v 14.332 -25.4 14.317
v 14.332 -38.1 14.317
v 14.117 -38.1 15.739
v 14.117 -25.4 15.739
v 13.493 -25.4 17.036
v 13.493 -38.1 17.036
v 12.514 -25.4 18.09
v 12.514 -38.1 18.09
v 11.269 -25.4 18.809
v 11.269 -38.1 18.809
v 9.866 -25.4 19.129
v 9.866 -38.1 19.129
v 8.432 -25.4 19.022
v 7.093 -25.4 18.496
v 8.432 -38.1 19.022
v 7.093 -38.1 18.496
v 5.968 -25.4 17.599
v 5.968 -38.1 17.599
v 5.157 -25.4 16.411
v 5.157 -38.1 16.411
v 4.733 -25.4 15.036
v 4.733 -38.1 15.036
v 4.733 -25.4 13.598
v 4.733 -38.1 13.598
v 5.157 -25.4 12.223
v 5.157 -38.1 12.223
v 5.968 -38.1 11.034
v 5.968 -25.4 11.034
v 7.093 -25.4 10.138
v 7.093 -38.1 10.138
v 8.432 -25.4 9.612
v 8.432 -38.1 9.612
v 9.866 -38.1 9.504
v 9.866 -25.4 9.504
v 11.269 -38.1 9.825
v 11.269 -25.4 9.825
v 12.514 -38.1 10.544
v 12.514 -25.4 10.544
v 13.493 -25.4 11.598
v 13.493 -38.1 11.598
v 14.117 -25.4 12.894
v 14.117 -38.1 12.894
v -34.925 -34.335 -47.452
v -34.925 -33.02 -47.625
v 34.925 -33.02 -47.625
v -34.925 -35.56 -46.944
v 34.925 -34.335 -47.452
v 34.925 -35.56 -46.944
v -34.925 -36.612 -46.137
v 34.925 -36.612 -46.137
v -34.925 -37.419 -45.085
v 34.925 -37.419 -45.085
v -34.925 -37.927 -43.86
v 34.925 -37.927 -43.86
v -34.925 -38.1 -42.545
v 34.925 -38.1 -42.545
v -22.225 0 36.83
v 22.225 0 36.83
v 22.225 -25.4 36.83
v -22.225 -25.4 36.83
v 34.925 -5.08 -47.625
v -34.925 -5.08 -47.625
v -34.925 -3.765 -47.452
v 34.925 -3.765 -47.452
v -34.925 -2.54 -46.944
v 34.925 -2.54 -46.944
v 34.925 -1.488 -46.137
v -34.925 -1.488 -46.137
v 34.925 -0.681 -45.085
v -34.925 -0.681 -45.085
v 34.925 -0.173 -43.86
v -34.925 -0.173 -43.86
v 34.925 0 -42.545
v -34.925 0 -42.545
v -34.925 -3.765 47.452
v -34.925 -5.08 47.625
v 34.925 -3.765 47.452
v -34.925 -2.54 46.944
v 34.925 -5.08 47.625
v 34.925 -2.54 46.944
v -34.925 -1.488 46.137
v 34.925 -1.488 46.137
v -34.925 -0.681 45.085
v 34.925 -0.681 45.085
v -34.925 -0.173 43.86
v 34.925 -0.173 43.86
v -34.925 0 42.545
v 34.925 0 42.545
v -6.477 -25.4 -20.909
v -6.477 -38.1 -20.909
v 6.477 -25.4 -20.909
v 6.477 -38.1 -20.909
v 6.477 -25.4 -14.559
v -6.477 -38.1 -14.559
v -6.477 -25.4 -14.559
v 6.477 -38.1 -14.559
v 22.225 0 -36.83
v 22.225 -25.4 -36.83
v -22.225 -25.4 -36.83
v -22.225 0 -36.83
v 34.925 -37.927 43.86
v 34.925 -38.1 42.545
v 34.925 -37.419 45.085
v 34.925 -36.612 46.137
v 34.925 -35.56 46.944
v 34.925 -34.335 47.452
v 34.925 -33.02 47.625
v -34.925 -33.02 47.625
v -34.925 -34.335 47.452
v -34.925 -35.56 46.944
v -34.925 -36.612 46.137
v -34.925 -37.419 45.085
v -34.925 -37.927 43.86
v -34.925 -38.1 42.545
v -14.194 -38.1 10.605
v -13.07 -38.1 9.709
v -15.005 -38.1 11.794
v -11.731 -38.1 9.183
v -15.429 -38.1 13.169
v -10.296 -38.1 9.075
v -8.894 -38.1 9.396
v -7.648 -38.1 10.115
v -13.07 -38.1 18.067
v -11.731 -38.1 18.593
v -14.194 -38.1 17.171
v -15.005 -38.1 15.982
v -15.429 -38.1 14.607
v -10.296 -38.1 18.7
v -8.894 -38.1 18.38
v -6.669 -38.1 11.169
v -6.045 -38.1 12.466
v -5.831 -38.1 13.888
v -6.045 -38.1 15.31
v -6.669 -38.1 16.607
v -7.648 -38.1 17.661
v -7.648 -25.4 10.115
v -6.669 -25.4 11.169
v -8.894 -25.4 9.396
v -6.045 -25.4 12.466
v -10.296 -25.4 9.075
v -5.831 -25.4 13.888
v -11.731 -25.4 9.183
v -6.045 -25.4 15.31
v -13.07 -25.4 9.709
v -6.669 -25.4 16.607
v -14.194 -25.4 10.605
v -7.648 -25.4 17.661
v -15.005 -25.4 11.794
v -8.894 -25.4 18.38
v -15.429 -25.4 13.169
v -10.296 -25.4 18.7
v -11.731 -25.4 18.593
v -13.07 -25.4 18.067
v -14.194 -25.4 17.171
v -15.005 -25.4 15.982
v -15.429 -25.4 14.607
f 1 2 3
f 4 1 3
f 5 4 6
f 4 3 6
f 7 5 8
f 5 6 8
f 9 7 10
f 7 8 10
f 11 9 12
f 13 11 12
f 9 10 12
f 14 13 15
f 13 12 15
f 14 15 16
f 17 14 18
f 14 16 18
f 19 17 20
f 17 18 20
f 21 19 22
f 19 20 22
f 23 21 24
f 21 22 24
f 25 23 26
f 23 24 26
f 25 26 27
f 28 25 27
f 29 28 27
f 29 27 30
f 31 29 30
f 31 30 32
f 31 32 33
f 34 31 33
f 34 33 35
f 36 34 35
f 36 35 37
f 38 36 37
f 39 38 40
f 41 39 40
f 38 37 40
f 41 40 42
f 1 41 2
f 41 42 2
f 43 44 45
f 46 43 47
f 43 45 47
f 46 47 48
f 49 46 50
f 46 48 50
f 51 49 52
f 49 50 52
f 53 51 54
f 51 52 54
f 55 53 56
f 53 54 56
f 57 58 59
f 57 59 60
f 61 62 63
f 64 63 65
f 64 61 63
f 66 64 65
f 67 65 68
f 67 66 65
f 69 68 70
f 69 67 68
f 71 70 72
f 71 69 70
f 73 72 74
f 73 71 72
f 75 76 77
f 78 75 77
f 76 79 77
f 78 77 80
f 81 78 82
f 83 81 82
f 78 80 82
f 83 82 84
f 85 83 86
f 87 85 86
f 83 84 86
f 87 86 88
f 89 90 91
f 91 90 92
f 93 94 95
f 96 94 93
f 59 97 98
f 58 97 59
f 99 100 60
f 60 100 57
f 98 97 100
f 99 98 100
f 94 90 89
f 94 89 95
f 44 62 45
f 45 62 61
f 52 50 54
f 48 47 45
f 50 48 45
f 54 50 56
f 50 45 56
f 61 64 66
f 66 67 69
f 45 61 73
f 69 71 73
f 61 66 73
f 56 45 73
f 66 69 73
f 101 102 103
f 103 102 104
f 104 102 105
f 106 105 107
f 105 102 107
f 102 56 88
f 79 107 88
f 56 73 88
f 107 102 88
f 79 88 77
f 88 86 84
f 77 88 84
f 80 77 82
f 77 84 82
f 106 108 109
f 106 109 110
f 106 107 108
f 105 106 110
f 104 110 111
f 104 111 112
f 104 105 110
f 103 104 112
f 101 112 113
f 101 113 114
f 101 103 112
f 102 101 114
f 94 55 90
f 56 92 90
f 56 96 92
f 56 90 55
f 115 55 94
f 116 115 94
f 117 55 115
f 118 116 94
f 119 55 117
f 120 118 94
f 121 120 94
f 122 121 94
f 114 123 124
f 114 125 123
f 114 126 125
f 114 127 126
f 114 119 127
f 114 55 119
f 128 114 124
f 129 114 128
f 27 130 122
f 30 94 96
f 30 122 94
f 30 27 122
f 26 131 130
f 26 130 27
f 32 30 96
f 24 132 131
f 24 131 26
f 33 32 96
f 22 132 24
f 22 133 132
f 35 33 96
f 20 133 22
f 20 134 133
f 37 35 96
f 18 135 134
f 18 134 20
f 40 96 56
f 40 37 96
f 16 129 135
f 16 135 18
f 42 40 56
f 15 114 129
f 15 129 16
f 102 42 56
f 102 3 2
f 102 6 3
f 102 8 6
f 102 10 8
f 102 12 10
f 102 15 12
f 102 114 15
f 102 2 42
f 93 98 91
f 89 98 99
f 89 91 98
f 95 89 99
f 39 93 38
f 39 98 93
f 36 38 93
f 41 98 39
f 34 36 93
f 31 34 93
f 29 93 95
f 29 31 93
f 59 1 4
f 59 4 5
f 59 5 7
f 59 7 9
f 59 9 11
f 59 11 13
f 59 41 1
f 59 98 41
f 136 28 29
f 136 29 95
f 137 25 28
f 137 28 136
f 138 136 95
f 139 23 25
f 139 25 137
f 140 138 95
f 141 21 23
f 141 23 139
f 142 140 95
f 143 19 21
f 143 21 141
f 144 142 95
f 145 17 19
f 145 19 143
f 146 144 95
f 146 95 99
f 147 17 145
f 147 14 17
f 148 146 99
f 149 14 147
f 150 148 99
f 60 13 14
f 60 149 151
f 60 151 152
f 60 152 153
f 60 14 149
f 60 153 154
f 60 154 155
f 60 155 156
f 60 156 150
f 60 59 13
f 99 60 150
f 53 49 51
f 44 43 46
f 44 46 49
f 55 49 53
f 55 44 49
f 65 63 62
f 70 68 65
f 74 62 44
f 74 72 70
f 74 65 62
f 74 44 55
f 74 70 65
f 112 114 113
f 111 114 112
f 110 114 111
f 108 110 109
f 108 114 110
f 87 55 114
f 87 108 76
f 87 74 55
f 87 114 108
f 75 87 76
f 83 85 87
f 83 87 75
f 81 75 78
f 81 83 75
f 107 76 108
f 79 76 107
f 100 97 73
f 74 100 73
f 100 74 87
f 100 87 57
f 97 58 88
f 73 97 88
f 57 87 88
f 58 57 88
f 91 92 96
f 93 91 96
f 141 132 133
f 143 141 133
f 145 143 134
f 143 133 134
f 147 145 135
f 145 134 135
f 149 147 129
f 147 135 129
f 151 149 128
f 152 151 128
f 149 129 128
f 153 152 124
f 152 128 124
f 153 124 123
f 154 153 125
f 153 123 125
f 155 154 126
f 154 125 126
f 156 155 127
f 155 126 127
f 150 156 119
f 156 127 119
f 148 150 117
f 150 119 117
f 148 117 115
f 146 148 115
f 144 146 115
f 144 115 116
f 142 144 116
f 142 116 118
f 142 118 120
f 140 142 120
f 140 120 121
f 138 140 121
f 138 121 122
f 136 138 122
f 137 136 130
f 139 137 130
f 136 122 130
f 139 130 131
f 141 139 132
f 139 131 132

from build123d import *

# Parameters (mm, degrees)
F0_W     = 69.85
F0_H     = 95.25
F1_DEPTH = 38.1
F2_W     = 44.45
F2_H     = 73.66
F3_DEPTH = 25.4
F4_R     = 5.08
F5_R     = 4.826
F6_DEPTH = 12.7
F7_W     = 12.954
F7_H     = 6.35
F8_DEPTH = 12.7


# Not quite as in the source:
# - a feature names something its author has since deleted; it is built from what else it names


with BuildPart() as f1:
    # F0 (on Front) → F1 (new body)
    with BuildSketch(Plane.XZ):
        Rectangle(F0_W, F0_H)
    extrude(amount=F1_DEPTH)

    # F2 (on face) → F3 (cut)
    with BuildSketch(Plane(origin=(0, 0, 0), x_dir=(-1, 0, 0), z_dir=(0, 1, 0))):
        Rectangle(F2_W, F2_H)
    extrude(amount=-F3_DEPTH, mode=Mode.SUBTRACT)

    # F4
    f4_edges = [f1.edges().sort_by_distance(p)[0] for p in [
        (0, -38.1, 47.625),
        (0, 0, 47.625),
        (0, -38.1, -47.625),
        (0, 0, -47.625),
    ]]
    fillet(f4_edges, radius=F4_R)

    # F5 (on face) → F6 (cut)
    with BuildSketch(Plane.XZ.offset(38.1)):
        with Locations((-10.6567444081, 13.887990205)):
            Circle(F5_R)
        with Locations((9.5055226038, 14.3169752002)):
            Circle(F5_R)
    extrude(amount=-F6_DEPTH, mode=Mode.SUBTRACT)

    # F7 (on face) → F8 (cut)
    with BuildSketch(Plane.XZ.offset(38.1)):
        with Locations((0, -17.7338177471)):
            Rectangle(F7_W, F7_H)
    extrude(amount=-F8_DEPTH, mode=Mode.SUBTRACT)


solid = f1.part
